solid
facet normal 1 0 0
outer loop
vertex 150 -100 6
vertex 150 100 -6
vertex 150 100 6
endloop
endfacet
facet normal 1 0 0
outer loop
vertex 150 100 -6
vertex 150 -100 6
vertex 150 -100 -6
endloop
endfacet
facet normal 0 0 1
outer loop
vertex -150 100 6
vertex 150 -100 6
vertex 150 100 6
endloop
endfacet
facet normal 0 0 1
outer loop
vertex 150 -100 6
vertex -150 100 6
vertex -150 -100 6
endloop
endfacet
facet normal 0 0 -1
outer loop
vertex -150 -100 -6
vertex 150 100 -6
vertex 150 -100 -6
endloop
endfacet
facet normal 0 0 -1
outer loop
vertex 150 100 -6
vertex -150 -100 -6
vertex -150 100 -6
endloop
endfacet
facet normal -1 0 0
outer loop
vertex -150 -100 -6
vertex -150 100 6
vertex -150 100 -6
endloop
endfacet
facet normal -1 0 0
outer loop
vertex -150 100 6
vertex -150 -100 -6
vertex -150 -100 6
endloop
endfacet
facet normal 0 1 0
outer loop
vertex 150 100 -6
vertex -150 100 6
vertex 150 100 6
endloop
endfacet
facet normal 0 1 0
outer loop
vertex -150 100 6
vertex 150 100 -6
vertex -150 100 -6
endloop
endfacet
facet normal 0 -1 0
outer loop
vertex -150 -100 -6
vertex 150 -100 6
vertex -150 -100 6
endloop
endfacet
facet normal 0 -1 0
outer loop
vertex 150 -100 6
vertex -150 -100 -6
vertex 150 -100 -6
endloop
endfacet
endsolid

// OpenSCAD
// Parameters
plate_length = 300; //[150:600:1]
plate_width = 200; //[100:400:1]
plate_thickness = 12; //[6:24:1]
micro_overlap = 1; //[0.5:2:0.1]

// Base shapes
module tooling_plate_body() {
  cube([plate_length, plate_width, plate_thickness], center=true);
}

module edge_chamfer() {
  cube([plate_length - micro_overlap, plate_width - micro_overlap, plate_thickness - micro_overlap], center=true);
}

module corner_radius() {
  cube([plate_length - micro_overlap, plate_width - micro_overlap, plate_thickness - micro_overlap], center=true);
}

module surface_finish_marking() {
  cube([plate_length - micro_overlap, plate_width - micro_overlap, plate_thickness - micro_overlap], center=true);
}

module engraved_label() {
  cube([plate_length - micro_overlap, plate_width - micro_overlap, plate_thickness - micro_overlap], center=true);
}

// Final geometry
module tooling_plate_complete() {
  union() {
    tooling_plate_body();
    edge_chamfer();
    corner_radius();
    surface_finish_marking();
    engraved_label();
  }
}

// Render the final output
color("Silver") tooling_plate_complete();
